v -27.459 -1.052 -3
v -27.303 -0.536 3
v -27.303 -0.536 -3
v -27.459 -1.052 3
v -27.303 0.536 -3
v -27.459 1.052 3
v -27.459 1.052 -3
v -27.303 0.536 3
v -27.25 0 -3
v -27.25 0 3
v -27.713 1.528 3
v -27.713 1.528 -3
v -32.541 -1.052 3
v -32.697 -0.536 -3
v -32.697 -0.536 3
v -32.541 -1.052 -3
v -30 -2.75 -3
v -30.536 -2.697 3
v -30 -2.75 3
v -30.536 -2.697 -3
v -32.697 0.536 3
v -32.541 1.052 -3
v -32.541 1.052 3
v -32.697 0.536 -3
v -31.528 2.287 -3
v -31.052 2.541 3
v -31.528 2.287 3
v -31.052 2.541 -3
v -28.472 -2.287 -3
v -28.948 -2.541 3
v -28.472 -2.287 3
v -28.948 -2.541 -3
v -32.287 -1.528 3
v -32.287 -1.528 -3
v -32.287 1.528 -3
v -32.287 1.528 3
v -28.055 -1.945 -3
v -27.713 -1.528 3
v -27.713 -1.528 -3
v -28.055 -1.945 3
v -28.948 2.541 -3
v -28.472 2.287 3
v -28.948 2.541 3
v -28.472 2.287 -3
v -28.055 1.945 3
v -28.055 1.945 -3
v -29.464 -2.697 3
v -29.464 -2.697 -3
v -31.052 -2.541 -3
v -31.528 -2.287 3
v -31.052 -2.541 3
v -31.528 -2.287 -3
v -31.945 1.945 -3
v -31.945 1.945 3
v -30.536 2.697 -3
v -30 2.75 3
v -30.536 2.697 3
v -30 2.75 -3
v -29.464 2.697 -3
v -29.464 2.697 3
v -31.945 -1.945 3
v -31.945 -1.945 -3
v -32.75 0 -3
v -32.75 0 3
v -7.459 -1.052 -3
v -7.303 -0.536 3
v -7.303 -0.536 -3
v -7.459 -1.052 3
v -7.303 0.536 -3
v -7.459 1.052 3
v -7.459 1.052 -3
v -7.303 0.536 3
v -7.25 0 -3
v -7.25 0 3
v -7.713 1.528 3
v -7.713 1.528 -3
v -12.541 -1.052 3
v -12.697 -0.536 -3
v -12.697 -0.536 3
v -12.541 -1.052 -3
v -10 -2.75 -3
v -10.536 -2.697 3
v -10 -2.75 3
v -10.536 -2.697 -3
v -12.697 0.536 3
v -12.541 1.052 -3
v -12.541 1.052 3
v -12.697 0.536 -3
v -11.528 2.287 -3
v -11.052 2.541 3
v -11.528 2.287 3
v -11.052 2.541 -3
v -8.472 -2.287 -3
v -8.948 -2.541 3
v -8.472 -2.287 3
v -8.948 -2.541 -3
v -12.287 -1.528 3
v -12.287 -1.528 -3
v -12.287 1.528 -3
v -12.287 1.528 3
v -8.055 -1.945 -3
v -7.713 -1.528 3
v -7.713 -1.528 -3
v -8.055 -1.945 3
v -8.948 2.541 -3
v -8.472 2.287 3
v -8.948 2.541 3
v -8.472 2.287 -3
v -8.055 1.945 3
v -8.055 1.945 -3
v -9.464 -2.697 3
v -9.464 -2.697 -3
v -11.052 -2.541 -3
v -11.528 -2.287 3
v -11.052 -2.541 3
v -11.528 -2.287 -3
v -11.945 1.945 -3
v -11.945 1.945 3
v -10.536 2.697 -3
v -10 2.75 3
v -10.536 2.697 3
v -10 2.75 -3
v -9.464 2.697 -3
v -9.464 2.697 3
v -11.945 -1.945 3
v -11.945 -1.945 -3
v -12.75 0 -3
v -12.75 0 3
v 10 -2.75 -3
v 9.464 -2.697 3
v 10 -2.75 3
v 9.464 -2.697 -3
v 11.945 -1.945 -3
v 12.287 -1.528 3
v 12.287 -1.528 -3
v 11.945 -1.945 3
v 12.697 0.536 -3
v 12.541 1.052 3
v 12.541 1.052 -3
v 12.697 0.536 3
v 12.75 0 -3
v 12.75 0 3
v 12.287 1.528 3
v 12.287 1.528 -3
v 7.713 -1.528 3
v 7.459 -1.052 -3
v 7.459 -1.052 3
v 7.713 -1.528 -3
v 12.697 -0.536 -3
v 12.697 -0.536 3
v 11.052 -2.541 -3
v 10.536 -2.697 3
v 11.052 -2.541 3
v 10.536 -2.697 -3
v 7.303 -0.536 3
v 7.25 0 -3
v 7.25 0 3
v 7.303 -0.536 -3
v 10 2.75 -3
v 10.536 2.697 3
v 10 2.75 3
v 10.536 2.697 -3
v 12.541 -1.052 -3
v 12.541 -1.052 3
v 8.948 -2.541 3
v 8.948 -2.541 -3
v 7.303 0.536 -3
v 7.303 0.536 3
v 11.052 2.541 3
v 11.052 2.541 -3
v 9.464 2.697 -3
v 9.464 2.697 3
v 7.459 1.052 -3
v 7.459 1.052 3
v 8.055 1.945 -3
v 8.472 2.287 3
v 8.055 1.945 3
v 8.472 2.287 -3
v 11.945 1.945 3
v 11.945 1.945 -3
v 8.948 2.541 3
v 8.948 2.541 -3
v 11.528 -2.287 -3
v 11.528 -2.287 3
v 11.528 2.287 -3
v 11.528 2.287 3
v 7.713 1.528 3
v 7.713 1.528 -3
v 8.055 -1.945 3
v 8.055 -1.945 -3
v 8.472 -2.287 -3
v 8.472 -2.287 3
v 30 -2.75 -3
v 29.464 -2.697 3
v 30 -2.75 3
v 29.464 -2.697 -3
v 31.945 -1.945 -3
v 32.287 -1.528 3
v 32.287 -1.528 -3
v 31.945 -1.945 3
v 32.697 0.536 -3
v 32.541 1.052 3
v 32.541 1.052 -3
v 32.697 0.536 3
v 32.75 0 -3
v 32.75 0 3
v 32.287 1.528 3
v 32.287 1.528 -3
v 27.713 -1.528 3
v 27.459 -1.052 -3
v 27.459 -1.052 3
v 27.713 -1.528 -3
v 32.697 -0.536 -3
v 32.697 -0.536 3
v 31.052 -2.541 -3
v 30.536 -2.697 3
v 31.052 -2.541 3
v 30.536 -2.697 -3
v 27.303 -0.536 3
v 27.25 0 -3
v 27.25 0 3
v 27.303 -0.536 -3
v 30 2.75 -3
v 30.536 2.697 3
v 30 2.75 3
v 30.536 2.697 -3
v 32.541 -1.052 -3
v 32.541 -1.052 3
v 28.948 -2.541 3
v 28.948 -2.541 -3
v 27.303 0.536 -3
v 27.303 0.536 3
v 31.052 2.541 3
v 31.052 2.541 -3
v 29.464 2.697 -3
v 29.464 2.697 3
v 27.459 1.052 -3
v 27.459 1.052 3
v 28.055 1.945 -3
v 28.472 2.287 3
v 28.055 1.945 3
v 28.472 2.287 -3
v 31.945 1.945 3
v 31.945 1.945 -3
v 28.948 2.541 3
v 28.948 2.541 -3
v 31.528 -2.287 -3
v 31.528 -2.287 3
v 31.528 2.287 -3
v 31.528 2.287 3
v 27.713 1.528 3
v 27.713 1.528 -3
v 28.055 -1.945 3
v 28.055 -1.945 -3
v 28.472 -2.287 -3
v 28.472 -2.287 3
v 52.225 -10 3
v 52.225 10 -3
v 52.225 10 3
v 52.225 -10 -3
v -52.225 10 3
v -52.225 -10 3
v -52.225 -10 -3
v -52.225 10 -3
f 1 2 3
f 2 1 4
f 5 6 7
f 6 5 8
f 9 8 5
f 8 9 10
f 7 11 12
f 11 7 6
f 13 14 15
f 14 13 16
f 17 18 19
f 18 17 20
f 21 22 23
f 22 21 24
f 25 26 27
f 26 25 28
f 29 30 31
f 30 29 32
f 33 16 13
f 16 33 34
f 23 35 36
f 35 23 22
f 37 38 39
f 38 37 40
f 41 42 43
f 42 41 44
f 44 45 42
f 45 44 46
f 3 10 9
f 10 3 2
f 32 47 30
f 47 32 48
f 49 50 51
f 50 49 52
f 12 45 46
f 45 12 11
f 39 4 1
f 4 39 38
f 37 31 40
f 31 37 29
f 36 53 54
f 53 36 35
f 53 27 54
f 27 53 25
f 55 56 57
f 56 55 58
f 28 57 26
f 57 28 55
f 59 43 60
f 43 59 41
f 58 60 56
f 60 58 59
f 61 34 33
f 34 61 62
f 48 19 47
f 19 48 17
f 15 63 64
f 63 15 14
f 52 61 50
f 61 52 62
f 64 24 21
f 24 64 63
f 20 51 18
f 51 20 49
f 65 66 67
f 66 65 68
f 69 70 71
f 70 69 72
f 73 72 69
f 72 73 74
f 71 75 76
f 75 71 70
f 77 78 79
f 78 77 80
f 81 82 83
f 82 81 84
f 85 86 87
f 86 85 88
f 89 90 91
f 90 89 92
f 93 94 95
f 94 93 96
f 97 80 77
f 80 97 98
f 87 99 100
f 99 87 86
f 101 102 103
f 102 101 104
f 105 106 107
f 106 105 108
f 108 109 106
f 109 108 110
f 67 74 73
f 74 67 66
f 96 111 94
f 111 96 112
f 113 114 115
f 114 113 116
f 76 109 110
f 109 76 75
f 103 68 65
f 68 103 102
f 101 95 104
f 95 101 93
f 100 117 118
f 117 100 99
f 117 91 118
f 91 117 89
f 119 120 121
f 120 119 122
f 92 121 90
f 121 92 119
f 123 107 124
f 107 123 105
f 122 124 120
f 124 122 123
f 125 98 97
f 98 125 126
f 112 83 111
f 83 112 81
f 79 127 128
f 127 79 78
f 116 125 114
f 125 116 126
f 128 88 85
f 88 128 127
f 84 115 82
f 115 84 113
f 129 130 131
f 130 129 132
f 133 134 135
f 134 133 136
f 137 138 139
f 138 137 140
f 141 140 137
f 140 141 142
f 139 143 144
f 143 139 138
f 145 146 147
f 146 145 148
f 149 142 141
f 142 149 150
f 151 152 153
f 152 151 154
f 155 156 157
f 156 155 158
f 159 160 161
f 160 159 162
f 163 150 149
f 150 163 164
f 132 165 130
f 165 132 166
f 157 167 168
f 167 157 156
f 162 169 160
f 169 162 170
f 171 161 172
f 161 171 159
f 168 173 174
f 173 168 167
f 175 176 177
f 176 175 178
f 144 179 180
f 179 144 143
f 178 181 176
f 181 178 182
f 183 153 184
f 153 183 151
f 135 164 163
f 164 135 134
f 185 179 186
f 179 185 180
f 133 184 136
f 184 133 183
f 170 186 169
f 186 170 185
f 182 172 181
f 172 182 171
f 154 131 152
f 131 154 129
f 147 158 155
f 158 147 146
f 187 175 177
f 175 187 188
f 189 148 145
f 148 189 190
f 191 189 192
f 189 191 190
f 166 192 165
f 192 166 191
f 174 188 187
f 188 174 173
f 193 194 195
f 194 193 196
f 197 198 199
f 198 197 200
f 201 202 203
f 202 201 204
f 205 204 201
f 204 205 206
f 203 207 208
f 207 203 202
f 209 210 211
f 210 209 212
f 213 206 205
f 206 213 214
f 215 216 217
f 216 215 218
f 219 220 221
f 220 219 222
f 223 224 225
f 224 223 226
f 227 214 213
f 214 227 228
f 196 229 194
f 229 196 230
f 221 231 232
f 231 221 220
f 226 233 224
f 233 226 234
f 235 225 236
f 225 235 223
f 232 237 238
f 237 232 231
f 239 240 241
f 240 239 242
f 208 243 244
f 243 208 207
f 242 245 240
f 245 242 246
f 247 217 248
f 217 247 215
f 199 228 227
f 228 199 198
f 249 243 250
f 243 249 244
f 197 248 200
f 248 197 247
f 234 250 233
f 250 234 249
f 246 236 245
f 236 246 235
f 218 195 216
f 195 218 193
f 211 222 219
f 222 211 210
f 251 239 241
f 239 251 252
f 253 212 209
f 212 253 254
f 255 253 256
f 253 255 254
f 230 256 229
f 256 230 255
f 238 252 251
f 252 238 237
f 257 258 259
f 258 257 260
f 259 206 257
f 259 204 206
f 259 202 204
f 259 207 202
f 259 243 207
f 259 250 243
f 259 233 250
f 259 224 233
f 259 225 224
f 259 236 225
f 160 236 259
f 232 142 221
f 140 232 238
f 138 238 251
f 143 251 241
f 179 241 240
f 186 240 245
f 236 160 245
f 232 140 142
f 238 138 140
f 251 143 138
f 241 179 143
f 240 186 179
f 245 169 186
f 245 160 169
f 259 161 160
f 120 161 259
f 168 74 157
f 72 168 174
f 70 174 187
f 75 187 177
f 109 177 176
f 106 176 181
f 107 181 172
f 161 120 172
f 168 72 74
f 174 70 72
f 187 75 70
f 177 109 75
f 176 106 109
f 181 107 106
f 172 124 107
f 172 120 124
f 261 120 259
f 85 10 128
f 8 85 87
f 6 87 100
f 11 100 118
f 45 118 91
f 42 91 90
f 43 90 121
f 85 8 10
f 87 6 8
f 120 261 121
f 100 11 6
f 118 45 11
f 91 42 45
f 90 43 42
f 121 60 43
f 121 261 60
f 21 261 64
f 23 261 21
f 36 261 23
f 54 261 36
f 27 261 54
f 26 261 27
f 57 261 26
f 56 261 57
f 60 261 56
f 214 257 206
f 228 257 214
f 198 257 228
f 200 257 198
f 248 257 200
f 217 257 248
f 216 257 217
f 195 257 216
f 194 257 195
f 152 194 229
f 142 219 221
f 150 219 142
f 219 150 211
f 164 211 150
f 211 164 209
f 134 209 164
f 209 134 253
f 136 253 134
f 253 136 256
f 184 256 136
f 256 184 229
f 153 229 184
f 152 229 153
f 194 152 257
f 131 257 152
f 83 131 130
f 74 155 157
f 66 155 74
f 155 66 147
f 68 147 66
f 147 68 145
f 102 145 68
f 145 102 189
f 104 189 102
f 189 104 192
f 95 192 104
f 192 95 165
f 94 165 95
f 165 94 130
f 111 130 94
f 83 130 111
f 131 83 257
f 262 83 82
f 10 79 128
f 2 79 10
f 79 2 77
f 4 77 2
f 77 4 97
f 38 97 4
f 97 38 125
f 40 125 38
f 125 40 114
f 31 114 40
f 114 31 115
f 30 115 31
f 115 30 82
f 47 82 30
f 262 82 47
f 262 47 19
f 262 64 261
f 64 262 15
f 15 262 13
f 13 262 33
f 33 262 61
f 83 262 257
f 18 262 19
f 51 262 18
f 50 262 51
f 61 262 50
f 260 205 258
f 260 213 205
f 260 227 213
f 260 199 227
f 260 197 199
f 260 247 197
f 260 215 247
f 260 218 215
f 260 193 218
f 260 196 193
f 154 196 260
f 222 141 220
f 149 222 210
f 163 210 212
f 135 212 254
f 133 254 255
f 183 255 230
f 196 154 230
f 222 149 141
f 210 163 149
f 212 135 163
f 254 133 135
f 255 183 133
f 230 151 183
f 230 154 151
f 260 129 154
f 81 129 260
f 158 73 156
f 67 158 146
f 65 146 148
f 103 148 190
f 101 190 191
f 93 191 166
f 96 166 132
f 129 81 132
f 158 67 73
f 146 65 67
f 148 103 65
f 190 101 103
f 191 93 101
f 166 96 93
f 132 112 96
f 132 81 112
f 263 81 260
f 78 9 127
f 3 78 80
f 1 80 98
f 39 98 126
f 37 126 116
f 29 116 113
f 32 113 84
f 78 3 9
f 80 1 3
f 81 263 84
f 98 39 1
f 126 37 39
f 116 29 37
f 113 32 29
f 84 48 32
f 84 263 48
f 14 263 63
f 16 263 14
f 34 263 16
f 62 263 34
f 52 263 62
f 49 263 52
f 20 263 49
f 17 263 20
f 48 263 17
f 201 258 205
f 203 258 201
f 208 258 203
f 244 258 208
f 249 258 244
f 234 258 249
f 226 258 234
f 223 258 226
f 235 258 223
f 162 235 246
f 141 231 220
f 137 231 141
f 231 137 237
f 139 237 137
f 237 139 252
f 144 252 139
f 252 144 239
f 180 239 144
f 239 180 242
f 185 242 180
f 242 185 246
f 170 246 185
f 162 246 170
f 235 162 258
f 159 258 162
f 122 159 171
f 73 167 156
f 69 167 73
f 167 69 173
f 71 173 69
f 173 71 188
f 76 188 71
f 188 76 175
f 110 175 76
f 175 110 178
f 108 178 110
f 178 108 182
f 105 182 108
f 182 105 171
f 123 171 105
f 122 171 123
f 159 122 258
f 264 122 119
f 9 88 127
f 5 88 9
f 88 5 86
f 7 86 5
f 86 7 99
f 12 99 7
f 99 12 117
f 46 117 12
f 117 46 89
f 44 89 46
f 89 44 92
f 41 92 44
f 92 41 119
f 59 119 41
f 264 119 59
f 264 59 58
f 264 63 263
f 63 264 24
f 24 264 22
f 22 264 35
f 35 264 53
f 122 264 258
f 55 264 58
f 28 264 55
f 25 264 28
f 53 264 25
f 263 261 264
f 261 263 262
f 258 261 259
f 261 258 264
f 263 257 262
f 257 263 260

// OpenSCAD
$fn = 32;

// ----------------------------------------------------------------------
// Hole bar, 4 x Ø5.5
// row layout, 22.225 mm edge offset
// ----------------------------------------------------------------------

// --- parameters (mm) ---
bar_w = 20;     // bar width (Y)
bar_t = 6;      // bar thickness (Z)
holes = 4;      // holes per row
hole_d = 5.5;   // hole diameter
edge = 22.225;  // offset from the bar end to the first hole
pitch = 20;     // pitch between neighbouring holes

// --- derived feature positions (mm) ---
span = (holes - 1) * pitch;   // = 60   distance between the end holes
bar_l = span + 2 * edge;      // = 104.45   overall bar length
start_x = -bar_l / 2 + edge;  // = -30   X of the first hole
feature_centers = [
  [start_x + 0 * pitch, 0],
  [start_x + 1 * pitch, 0],
  [start_x + 2 * pitch, 0],
  [start_x + 3 * pitch, 0]
];   // hole centres of the first row

// bar with one row of holes, drilled from feature_centers
difference() {
  translate([-bar_l / 2, -bar_w / 2, -bar_t / 2]) cube([bar_l, bar_w, bar_t]);
  for (centre = feature_centers)
    translate([centre[0], centre[1], 0])
      cylinder(d = hole_d, h = bar_t + 2, center = true);
}
